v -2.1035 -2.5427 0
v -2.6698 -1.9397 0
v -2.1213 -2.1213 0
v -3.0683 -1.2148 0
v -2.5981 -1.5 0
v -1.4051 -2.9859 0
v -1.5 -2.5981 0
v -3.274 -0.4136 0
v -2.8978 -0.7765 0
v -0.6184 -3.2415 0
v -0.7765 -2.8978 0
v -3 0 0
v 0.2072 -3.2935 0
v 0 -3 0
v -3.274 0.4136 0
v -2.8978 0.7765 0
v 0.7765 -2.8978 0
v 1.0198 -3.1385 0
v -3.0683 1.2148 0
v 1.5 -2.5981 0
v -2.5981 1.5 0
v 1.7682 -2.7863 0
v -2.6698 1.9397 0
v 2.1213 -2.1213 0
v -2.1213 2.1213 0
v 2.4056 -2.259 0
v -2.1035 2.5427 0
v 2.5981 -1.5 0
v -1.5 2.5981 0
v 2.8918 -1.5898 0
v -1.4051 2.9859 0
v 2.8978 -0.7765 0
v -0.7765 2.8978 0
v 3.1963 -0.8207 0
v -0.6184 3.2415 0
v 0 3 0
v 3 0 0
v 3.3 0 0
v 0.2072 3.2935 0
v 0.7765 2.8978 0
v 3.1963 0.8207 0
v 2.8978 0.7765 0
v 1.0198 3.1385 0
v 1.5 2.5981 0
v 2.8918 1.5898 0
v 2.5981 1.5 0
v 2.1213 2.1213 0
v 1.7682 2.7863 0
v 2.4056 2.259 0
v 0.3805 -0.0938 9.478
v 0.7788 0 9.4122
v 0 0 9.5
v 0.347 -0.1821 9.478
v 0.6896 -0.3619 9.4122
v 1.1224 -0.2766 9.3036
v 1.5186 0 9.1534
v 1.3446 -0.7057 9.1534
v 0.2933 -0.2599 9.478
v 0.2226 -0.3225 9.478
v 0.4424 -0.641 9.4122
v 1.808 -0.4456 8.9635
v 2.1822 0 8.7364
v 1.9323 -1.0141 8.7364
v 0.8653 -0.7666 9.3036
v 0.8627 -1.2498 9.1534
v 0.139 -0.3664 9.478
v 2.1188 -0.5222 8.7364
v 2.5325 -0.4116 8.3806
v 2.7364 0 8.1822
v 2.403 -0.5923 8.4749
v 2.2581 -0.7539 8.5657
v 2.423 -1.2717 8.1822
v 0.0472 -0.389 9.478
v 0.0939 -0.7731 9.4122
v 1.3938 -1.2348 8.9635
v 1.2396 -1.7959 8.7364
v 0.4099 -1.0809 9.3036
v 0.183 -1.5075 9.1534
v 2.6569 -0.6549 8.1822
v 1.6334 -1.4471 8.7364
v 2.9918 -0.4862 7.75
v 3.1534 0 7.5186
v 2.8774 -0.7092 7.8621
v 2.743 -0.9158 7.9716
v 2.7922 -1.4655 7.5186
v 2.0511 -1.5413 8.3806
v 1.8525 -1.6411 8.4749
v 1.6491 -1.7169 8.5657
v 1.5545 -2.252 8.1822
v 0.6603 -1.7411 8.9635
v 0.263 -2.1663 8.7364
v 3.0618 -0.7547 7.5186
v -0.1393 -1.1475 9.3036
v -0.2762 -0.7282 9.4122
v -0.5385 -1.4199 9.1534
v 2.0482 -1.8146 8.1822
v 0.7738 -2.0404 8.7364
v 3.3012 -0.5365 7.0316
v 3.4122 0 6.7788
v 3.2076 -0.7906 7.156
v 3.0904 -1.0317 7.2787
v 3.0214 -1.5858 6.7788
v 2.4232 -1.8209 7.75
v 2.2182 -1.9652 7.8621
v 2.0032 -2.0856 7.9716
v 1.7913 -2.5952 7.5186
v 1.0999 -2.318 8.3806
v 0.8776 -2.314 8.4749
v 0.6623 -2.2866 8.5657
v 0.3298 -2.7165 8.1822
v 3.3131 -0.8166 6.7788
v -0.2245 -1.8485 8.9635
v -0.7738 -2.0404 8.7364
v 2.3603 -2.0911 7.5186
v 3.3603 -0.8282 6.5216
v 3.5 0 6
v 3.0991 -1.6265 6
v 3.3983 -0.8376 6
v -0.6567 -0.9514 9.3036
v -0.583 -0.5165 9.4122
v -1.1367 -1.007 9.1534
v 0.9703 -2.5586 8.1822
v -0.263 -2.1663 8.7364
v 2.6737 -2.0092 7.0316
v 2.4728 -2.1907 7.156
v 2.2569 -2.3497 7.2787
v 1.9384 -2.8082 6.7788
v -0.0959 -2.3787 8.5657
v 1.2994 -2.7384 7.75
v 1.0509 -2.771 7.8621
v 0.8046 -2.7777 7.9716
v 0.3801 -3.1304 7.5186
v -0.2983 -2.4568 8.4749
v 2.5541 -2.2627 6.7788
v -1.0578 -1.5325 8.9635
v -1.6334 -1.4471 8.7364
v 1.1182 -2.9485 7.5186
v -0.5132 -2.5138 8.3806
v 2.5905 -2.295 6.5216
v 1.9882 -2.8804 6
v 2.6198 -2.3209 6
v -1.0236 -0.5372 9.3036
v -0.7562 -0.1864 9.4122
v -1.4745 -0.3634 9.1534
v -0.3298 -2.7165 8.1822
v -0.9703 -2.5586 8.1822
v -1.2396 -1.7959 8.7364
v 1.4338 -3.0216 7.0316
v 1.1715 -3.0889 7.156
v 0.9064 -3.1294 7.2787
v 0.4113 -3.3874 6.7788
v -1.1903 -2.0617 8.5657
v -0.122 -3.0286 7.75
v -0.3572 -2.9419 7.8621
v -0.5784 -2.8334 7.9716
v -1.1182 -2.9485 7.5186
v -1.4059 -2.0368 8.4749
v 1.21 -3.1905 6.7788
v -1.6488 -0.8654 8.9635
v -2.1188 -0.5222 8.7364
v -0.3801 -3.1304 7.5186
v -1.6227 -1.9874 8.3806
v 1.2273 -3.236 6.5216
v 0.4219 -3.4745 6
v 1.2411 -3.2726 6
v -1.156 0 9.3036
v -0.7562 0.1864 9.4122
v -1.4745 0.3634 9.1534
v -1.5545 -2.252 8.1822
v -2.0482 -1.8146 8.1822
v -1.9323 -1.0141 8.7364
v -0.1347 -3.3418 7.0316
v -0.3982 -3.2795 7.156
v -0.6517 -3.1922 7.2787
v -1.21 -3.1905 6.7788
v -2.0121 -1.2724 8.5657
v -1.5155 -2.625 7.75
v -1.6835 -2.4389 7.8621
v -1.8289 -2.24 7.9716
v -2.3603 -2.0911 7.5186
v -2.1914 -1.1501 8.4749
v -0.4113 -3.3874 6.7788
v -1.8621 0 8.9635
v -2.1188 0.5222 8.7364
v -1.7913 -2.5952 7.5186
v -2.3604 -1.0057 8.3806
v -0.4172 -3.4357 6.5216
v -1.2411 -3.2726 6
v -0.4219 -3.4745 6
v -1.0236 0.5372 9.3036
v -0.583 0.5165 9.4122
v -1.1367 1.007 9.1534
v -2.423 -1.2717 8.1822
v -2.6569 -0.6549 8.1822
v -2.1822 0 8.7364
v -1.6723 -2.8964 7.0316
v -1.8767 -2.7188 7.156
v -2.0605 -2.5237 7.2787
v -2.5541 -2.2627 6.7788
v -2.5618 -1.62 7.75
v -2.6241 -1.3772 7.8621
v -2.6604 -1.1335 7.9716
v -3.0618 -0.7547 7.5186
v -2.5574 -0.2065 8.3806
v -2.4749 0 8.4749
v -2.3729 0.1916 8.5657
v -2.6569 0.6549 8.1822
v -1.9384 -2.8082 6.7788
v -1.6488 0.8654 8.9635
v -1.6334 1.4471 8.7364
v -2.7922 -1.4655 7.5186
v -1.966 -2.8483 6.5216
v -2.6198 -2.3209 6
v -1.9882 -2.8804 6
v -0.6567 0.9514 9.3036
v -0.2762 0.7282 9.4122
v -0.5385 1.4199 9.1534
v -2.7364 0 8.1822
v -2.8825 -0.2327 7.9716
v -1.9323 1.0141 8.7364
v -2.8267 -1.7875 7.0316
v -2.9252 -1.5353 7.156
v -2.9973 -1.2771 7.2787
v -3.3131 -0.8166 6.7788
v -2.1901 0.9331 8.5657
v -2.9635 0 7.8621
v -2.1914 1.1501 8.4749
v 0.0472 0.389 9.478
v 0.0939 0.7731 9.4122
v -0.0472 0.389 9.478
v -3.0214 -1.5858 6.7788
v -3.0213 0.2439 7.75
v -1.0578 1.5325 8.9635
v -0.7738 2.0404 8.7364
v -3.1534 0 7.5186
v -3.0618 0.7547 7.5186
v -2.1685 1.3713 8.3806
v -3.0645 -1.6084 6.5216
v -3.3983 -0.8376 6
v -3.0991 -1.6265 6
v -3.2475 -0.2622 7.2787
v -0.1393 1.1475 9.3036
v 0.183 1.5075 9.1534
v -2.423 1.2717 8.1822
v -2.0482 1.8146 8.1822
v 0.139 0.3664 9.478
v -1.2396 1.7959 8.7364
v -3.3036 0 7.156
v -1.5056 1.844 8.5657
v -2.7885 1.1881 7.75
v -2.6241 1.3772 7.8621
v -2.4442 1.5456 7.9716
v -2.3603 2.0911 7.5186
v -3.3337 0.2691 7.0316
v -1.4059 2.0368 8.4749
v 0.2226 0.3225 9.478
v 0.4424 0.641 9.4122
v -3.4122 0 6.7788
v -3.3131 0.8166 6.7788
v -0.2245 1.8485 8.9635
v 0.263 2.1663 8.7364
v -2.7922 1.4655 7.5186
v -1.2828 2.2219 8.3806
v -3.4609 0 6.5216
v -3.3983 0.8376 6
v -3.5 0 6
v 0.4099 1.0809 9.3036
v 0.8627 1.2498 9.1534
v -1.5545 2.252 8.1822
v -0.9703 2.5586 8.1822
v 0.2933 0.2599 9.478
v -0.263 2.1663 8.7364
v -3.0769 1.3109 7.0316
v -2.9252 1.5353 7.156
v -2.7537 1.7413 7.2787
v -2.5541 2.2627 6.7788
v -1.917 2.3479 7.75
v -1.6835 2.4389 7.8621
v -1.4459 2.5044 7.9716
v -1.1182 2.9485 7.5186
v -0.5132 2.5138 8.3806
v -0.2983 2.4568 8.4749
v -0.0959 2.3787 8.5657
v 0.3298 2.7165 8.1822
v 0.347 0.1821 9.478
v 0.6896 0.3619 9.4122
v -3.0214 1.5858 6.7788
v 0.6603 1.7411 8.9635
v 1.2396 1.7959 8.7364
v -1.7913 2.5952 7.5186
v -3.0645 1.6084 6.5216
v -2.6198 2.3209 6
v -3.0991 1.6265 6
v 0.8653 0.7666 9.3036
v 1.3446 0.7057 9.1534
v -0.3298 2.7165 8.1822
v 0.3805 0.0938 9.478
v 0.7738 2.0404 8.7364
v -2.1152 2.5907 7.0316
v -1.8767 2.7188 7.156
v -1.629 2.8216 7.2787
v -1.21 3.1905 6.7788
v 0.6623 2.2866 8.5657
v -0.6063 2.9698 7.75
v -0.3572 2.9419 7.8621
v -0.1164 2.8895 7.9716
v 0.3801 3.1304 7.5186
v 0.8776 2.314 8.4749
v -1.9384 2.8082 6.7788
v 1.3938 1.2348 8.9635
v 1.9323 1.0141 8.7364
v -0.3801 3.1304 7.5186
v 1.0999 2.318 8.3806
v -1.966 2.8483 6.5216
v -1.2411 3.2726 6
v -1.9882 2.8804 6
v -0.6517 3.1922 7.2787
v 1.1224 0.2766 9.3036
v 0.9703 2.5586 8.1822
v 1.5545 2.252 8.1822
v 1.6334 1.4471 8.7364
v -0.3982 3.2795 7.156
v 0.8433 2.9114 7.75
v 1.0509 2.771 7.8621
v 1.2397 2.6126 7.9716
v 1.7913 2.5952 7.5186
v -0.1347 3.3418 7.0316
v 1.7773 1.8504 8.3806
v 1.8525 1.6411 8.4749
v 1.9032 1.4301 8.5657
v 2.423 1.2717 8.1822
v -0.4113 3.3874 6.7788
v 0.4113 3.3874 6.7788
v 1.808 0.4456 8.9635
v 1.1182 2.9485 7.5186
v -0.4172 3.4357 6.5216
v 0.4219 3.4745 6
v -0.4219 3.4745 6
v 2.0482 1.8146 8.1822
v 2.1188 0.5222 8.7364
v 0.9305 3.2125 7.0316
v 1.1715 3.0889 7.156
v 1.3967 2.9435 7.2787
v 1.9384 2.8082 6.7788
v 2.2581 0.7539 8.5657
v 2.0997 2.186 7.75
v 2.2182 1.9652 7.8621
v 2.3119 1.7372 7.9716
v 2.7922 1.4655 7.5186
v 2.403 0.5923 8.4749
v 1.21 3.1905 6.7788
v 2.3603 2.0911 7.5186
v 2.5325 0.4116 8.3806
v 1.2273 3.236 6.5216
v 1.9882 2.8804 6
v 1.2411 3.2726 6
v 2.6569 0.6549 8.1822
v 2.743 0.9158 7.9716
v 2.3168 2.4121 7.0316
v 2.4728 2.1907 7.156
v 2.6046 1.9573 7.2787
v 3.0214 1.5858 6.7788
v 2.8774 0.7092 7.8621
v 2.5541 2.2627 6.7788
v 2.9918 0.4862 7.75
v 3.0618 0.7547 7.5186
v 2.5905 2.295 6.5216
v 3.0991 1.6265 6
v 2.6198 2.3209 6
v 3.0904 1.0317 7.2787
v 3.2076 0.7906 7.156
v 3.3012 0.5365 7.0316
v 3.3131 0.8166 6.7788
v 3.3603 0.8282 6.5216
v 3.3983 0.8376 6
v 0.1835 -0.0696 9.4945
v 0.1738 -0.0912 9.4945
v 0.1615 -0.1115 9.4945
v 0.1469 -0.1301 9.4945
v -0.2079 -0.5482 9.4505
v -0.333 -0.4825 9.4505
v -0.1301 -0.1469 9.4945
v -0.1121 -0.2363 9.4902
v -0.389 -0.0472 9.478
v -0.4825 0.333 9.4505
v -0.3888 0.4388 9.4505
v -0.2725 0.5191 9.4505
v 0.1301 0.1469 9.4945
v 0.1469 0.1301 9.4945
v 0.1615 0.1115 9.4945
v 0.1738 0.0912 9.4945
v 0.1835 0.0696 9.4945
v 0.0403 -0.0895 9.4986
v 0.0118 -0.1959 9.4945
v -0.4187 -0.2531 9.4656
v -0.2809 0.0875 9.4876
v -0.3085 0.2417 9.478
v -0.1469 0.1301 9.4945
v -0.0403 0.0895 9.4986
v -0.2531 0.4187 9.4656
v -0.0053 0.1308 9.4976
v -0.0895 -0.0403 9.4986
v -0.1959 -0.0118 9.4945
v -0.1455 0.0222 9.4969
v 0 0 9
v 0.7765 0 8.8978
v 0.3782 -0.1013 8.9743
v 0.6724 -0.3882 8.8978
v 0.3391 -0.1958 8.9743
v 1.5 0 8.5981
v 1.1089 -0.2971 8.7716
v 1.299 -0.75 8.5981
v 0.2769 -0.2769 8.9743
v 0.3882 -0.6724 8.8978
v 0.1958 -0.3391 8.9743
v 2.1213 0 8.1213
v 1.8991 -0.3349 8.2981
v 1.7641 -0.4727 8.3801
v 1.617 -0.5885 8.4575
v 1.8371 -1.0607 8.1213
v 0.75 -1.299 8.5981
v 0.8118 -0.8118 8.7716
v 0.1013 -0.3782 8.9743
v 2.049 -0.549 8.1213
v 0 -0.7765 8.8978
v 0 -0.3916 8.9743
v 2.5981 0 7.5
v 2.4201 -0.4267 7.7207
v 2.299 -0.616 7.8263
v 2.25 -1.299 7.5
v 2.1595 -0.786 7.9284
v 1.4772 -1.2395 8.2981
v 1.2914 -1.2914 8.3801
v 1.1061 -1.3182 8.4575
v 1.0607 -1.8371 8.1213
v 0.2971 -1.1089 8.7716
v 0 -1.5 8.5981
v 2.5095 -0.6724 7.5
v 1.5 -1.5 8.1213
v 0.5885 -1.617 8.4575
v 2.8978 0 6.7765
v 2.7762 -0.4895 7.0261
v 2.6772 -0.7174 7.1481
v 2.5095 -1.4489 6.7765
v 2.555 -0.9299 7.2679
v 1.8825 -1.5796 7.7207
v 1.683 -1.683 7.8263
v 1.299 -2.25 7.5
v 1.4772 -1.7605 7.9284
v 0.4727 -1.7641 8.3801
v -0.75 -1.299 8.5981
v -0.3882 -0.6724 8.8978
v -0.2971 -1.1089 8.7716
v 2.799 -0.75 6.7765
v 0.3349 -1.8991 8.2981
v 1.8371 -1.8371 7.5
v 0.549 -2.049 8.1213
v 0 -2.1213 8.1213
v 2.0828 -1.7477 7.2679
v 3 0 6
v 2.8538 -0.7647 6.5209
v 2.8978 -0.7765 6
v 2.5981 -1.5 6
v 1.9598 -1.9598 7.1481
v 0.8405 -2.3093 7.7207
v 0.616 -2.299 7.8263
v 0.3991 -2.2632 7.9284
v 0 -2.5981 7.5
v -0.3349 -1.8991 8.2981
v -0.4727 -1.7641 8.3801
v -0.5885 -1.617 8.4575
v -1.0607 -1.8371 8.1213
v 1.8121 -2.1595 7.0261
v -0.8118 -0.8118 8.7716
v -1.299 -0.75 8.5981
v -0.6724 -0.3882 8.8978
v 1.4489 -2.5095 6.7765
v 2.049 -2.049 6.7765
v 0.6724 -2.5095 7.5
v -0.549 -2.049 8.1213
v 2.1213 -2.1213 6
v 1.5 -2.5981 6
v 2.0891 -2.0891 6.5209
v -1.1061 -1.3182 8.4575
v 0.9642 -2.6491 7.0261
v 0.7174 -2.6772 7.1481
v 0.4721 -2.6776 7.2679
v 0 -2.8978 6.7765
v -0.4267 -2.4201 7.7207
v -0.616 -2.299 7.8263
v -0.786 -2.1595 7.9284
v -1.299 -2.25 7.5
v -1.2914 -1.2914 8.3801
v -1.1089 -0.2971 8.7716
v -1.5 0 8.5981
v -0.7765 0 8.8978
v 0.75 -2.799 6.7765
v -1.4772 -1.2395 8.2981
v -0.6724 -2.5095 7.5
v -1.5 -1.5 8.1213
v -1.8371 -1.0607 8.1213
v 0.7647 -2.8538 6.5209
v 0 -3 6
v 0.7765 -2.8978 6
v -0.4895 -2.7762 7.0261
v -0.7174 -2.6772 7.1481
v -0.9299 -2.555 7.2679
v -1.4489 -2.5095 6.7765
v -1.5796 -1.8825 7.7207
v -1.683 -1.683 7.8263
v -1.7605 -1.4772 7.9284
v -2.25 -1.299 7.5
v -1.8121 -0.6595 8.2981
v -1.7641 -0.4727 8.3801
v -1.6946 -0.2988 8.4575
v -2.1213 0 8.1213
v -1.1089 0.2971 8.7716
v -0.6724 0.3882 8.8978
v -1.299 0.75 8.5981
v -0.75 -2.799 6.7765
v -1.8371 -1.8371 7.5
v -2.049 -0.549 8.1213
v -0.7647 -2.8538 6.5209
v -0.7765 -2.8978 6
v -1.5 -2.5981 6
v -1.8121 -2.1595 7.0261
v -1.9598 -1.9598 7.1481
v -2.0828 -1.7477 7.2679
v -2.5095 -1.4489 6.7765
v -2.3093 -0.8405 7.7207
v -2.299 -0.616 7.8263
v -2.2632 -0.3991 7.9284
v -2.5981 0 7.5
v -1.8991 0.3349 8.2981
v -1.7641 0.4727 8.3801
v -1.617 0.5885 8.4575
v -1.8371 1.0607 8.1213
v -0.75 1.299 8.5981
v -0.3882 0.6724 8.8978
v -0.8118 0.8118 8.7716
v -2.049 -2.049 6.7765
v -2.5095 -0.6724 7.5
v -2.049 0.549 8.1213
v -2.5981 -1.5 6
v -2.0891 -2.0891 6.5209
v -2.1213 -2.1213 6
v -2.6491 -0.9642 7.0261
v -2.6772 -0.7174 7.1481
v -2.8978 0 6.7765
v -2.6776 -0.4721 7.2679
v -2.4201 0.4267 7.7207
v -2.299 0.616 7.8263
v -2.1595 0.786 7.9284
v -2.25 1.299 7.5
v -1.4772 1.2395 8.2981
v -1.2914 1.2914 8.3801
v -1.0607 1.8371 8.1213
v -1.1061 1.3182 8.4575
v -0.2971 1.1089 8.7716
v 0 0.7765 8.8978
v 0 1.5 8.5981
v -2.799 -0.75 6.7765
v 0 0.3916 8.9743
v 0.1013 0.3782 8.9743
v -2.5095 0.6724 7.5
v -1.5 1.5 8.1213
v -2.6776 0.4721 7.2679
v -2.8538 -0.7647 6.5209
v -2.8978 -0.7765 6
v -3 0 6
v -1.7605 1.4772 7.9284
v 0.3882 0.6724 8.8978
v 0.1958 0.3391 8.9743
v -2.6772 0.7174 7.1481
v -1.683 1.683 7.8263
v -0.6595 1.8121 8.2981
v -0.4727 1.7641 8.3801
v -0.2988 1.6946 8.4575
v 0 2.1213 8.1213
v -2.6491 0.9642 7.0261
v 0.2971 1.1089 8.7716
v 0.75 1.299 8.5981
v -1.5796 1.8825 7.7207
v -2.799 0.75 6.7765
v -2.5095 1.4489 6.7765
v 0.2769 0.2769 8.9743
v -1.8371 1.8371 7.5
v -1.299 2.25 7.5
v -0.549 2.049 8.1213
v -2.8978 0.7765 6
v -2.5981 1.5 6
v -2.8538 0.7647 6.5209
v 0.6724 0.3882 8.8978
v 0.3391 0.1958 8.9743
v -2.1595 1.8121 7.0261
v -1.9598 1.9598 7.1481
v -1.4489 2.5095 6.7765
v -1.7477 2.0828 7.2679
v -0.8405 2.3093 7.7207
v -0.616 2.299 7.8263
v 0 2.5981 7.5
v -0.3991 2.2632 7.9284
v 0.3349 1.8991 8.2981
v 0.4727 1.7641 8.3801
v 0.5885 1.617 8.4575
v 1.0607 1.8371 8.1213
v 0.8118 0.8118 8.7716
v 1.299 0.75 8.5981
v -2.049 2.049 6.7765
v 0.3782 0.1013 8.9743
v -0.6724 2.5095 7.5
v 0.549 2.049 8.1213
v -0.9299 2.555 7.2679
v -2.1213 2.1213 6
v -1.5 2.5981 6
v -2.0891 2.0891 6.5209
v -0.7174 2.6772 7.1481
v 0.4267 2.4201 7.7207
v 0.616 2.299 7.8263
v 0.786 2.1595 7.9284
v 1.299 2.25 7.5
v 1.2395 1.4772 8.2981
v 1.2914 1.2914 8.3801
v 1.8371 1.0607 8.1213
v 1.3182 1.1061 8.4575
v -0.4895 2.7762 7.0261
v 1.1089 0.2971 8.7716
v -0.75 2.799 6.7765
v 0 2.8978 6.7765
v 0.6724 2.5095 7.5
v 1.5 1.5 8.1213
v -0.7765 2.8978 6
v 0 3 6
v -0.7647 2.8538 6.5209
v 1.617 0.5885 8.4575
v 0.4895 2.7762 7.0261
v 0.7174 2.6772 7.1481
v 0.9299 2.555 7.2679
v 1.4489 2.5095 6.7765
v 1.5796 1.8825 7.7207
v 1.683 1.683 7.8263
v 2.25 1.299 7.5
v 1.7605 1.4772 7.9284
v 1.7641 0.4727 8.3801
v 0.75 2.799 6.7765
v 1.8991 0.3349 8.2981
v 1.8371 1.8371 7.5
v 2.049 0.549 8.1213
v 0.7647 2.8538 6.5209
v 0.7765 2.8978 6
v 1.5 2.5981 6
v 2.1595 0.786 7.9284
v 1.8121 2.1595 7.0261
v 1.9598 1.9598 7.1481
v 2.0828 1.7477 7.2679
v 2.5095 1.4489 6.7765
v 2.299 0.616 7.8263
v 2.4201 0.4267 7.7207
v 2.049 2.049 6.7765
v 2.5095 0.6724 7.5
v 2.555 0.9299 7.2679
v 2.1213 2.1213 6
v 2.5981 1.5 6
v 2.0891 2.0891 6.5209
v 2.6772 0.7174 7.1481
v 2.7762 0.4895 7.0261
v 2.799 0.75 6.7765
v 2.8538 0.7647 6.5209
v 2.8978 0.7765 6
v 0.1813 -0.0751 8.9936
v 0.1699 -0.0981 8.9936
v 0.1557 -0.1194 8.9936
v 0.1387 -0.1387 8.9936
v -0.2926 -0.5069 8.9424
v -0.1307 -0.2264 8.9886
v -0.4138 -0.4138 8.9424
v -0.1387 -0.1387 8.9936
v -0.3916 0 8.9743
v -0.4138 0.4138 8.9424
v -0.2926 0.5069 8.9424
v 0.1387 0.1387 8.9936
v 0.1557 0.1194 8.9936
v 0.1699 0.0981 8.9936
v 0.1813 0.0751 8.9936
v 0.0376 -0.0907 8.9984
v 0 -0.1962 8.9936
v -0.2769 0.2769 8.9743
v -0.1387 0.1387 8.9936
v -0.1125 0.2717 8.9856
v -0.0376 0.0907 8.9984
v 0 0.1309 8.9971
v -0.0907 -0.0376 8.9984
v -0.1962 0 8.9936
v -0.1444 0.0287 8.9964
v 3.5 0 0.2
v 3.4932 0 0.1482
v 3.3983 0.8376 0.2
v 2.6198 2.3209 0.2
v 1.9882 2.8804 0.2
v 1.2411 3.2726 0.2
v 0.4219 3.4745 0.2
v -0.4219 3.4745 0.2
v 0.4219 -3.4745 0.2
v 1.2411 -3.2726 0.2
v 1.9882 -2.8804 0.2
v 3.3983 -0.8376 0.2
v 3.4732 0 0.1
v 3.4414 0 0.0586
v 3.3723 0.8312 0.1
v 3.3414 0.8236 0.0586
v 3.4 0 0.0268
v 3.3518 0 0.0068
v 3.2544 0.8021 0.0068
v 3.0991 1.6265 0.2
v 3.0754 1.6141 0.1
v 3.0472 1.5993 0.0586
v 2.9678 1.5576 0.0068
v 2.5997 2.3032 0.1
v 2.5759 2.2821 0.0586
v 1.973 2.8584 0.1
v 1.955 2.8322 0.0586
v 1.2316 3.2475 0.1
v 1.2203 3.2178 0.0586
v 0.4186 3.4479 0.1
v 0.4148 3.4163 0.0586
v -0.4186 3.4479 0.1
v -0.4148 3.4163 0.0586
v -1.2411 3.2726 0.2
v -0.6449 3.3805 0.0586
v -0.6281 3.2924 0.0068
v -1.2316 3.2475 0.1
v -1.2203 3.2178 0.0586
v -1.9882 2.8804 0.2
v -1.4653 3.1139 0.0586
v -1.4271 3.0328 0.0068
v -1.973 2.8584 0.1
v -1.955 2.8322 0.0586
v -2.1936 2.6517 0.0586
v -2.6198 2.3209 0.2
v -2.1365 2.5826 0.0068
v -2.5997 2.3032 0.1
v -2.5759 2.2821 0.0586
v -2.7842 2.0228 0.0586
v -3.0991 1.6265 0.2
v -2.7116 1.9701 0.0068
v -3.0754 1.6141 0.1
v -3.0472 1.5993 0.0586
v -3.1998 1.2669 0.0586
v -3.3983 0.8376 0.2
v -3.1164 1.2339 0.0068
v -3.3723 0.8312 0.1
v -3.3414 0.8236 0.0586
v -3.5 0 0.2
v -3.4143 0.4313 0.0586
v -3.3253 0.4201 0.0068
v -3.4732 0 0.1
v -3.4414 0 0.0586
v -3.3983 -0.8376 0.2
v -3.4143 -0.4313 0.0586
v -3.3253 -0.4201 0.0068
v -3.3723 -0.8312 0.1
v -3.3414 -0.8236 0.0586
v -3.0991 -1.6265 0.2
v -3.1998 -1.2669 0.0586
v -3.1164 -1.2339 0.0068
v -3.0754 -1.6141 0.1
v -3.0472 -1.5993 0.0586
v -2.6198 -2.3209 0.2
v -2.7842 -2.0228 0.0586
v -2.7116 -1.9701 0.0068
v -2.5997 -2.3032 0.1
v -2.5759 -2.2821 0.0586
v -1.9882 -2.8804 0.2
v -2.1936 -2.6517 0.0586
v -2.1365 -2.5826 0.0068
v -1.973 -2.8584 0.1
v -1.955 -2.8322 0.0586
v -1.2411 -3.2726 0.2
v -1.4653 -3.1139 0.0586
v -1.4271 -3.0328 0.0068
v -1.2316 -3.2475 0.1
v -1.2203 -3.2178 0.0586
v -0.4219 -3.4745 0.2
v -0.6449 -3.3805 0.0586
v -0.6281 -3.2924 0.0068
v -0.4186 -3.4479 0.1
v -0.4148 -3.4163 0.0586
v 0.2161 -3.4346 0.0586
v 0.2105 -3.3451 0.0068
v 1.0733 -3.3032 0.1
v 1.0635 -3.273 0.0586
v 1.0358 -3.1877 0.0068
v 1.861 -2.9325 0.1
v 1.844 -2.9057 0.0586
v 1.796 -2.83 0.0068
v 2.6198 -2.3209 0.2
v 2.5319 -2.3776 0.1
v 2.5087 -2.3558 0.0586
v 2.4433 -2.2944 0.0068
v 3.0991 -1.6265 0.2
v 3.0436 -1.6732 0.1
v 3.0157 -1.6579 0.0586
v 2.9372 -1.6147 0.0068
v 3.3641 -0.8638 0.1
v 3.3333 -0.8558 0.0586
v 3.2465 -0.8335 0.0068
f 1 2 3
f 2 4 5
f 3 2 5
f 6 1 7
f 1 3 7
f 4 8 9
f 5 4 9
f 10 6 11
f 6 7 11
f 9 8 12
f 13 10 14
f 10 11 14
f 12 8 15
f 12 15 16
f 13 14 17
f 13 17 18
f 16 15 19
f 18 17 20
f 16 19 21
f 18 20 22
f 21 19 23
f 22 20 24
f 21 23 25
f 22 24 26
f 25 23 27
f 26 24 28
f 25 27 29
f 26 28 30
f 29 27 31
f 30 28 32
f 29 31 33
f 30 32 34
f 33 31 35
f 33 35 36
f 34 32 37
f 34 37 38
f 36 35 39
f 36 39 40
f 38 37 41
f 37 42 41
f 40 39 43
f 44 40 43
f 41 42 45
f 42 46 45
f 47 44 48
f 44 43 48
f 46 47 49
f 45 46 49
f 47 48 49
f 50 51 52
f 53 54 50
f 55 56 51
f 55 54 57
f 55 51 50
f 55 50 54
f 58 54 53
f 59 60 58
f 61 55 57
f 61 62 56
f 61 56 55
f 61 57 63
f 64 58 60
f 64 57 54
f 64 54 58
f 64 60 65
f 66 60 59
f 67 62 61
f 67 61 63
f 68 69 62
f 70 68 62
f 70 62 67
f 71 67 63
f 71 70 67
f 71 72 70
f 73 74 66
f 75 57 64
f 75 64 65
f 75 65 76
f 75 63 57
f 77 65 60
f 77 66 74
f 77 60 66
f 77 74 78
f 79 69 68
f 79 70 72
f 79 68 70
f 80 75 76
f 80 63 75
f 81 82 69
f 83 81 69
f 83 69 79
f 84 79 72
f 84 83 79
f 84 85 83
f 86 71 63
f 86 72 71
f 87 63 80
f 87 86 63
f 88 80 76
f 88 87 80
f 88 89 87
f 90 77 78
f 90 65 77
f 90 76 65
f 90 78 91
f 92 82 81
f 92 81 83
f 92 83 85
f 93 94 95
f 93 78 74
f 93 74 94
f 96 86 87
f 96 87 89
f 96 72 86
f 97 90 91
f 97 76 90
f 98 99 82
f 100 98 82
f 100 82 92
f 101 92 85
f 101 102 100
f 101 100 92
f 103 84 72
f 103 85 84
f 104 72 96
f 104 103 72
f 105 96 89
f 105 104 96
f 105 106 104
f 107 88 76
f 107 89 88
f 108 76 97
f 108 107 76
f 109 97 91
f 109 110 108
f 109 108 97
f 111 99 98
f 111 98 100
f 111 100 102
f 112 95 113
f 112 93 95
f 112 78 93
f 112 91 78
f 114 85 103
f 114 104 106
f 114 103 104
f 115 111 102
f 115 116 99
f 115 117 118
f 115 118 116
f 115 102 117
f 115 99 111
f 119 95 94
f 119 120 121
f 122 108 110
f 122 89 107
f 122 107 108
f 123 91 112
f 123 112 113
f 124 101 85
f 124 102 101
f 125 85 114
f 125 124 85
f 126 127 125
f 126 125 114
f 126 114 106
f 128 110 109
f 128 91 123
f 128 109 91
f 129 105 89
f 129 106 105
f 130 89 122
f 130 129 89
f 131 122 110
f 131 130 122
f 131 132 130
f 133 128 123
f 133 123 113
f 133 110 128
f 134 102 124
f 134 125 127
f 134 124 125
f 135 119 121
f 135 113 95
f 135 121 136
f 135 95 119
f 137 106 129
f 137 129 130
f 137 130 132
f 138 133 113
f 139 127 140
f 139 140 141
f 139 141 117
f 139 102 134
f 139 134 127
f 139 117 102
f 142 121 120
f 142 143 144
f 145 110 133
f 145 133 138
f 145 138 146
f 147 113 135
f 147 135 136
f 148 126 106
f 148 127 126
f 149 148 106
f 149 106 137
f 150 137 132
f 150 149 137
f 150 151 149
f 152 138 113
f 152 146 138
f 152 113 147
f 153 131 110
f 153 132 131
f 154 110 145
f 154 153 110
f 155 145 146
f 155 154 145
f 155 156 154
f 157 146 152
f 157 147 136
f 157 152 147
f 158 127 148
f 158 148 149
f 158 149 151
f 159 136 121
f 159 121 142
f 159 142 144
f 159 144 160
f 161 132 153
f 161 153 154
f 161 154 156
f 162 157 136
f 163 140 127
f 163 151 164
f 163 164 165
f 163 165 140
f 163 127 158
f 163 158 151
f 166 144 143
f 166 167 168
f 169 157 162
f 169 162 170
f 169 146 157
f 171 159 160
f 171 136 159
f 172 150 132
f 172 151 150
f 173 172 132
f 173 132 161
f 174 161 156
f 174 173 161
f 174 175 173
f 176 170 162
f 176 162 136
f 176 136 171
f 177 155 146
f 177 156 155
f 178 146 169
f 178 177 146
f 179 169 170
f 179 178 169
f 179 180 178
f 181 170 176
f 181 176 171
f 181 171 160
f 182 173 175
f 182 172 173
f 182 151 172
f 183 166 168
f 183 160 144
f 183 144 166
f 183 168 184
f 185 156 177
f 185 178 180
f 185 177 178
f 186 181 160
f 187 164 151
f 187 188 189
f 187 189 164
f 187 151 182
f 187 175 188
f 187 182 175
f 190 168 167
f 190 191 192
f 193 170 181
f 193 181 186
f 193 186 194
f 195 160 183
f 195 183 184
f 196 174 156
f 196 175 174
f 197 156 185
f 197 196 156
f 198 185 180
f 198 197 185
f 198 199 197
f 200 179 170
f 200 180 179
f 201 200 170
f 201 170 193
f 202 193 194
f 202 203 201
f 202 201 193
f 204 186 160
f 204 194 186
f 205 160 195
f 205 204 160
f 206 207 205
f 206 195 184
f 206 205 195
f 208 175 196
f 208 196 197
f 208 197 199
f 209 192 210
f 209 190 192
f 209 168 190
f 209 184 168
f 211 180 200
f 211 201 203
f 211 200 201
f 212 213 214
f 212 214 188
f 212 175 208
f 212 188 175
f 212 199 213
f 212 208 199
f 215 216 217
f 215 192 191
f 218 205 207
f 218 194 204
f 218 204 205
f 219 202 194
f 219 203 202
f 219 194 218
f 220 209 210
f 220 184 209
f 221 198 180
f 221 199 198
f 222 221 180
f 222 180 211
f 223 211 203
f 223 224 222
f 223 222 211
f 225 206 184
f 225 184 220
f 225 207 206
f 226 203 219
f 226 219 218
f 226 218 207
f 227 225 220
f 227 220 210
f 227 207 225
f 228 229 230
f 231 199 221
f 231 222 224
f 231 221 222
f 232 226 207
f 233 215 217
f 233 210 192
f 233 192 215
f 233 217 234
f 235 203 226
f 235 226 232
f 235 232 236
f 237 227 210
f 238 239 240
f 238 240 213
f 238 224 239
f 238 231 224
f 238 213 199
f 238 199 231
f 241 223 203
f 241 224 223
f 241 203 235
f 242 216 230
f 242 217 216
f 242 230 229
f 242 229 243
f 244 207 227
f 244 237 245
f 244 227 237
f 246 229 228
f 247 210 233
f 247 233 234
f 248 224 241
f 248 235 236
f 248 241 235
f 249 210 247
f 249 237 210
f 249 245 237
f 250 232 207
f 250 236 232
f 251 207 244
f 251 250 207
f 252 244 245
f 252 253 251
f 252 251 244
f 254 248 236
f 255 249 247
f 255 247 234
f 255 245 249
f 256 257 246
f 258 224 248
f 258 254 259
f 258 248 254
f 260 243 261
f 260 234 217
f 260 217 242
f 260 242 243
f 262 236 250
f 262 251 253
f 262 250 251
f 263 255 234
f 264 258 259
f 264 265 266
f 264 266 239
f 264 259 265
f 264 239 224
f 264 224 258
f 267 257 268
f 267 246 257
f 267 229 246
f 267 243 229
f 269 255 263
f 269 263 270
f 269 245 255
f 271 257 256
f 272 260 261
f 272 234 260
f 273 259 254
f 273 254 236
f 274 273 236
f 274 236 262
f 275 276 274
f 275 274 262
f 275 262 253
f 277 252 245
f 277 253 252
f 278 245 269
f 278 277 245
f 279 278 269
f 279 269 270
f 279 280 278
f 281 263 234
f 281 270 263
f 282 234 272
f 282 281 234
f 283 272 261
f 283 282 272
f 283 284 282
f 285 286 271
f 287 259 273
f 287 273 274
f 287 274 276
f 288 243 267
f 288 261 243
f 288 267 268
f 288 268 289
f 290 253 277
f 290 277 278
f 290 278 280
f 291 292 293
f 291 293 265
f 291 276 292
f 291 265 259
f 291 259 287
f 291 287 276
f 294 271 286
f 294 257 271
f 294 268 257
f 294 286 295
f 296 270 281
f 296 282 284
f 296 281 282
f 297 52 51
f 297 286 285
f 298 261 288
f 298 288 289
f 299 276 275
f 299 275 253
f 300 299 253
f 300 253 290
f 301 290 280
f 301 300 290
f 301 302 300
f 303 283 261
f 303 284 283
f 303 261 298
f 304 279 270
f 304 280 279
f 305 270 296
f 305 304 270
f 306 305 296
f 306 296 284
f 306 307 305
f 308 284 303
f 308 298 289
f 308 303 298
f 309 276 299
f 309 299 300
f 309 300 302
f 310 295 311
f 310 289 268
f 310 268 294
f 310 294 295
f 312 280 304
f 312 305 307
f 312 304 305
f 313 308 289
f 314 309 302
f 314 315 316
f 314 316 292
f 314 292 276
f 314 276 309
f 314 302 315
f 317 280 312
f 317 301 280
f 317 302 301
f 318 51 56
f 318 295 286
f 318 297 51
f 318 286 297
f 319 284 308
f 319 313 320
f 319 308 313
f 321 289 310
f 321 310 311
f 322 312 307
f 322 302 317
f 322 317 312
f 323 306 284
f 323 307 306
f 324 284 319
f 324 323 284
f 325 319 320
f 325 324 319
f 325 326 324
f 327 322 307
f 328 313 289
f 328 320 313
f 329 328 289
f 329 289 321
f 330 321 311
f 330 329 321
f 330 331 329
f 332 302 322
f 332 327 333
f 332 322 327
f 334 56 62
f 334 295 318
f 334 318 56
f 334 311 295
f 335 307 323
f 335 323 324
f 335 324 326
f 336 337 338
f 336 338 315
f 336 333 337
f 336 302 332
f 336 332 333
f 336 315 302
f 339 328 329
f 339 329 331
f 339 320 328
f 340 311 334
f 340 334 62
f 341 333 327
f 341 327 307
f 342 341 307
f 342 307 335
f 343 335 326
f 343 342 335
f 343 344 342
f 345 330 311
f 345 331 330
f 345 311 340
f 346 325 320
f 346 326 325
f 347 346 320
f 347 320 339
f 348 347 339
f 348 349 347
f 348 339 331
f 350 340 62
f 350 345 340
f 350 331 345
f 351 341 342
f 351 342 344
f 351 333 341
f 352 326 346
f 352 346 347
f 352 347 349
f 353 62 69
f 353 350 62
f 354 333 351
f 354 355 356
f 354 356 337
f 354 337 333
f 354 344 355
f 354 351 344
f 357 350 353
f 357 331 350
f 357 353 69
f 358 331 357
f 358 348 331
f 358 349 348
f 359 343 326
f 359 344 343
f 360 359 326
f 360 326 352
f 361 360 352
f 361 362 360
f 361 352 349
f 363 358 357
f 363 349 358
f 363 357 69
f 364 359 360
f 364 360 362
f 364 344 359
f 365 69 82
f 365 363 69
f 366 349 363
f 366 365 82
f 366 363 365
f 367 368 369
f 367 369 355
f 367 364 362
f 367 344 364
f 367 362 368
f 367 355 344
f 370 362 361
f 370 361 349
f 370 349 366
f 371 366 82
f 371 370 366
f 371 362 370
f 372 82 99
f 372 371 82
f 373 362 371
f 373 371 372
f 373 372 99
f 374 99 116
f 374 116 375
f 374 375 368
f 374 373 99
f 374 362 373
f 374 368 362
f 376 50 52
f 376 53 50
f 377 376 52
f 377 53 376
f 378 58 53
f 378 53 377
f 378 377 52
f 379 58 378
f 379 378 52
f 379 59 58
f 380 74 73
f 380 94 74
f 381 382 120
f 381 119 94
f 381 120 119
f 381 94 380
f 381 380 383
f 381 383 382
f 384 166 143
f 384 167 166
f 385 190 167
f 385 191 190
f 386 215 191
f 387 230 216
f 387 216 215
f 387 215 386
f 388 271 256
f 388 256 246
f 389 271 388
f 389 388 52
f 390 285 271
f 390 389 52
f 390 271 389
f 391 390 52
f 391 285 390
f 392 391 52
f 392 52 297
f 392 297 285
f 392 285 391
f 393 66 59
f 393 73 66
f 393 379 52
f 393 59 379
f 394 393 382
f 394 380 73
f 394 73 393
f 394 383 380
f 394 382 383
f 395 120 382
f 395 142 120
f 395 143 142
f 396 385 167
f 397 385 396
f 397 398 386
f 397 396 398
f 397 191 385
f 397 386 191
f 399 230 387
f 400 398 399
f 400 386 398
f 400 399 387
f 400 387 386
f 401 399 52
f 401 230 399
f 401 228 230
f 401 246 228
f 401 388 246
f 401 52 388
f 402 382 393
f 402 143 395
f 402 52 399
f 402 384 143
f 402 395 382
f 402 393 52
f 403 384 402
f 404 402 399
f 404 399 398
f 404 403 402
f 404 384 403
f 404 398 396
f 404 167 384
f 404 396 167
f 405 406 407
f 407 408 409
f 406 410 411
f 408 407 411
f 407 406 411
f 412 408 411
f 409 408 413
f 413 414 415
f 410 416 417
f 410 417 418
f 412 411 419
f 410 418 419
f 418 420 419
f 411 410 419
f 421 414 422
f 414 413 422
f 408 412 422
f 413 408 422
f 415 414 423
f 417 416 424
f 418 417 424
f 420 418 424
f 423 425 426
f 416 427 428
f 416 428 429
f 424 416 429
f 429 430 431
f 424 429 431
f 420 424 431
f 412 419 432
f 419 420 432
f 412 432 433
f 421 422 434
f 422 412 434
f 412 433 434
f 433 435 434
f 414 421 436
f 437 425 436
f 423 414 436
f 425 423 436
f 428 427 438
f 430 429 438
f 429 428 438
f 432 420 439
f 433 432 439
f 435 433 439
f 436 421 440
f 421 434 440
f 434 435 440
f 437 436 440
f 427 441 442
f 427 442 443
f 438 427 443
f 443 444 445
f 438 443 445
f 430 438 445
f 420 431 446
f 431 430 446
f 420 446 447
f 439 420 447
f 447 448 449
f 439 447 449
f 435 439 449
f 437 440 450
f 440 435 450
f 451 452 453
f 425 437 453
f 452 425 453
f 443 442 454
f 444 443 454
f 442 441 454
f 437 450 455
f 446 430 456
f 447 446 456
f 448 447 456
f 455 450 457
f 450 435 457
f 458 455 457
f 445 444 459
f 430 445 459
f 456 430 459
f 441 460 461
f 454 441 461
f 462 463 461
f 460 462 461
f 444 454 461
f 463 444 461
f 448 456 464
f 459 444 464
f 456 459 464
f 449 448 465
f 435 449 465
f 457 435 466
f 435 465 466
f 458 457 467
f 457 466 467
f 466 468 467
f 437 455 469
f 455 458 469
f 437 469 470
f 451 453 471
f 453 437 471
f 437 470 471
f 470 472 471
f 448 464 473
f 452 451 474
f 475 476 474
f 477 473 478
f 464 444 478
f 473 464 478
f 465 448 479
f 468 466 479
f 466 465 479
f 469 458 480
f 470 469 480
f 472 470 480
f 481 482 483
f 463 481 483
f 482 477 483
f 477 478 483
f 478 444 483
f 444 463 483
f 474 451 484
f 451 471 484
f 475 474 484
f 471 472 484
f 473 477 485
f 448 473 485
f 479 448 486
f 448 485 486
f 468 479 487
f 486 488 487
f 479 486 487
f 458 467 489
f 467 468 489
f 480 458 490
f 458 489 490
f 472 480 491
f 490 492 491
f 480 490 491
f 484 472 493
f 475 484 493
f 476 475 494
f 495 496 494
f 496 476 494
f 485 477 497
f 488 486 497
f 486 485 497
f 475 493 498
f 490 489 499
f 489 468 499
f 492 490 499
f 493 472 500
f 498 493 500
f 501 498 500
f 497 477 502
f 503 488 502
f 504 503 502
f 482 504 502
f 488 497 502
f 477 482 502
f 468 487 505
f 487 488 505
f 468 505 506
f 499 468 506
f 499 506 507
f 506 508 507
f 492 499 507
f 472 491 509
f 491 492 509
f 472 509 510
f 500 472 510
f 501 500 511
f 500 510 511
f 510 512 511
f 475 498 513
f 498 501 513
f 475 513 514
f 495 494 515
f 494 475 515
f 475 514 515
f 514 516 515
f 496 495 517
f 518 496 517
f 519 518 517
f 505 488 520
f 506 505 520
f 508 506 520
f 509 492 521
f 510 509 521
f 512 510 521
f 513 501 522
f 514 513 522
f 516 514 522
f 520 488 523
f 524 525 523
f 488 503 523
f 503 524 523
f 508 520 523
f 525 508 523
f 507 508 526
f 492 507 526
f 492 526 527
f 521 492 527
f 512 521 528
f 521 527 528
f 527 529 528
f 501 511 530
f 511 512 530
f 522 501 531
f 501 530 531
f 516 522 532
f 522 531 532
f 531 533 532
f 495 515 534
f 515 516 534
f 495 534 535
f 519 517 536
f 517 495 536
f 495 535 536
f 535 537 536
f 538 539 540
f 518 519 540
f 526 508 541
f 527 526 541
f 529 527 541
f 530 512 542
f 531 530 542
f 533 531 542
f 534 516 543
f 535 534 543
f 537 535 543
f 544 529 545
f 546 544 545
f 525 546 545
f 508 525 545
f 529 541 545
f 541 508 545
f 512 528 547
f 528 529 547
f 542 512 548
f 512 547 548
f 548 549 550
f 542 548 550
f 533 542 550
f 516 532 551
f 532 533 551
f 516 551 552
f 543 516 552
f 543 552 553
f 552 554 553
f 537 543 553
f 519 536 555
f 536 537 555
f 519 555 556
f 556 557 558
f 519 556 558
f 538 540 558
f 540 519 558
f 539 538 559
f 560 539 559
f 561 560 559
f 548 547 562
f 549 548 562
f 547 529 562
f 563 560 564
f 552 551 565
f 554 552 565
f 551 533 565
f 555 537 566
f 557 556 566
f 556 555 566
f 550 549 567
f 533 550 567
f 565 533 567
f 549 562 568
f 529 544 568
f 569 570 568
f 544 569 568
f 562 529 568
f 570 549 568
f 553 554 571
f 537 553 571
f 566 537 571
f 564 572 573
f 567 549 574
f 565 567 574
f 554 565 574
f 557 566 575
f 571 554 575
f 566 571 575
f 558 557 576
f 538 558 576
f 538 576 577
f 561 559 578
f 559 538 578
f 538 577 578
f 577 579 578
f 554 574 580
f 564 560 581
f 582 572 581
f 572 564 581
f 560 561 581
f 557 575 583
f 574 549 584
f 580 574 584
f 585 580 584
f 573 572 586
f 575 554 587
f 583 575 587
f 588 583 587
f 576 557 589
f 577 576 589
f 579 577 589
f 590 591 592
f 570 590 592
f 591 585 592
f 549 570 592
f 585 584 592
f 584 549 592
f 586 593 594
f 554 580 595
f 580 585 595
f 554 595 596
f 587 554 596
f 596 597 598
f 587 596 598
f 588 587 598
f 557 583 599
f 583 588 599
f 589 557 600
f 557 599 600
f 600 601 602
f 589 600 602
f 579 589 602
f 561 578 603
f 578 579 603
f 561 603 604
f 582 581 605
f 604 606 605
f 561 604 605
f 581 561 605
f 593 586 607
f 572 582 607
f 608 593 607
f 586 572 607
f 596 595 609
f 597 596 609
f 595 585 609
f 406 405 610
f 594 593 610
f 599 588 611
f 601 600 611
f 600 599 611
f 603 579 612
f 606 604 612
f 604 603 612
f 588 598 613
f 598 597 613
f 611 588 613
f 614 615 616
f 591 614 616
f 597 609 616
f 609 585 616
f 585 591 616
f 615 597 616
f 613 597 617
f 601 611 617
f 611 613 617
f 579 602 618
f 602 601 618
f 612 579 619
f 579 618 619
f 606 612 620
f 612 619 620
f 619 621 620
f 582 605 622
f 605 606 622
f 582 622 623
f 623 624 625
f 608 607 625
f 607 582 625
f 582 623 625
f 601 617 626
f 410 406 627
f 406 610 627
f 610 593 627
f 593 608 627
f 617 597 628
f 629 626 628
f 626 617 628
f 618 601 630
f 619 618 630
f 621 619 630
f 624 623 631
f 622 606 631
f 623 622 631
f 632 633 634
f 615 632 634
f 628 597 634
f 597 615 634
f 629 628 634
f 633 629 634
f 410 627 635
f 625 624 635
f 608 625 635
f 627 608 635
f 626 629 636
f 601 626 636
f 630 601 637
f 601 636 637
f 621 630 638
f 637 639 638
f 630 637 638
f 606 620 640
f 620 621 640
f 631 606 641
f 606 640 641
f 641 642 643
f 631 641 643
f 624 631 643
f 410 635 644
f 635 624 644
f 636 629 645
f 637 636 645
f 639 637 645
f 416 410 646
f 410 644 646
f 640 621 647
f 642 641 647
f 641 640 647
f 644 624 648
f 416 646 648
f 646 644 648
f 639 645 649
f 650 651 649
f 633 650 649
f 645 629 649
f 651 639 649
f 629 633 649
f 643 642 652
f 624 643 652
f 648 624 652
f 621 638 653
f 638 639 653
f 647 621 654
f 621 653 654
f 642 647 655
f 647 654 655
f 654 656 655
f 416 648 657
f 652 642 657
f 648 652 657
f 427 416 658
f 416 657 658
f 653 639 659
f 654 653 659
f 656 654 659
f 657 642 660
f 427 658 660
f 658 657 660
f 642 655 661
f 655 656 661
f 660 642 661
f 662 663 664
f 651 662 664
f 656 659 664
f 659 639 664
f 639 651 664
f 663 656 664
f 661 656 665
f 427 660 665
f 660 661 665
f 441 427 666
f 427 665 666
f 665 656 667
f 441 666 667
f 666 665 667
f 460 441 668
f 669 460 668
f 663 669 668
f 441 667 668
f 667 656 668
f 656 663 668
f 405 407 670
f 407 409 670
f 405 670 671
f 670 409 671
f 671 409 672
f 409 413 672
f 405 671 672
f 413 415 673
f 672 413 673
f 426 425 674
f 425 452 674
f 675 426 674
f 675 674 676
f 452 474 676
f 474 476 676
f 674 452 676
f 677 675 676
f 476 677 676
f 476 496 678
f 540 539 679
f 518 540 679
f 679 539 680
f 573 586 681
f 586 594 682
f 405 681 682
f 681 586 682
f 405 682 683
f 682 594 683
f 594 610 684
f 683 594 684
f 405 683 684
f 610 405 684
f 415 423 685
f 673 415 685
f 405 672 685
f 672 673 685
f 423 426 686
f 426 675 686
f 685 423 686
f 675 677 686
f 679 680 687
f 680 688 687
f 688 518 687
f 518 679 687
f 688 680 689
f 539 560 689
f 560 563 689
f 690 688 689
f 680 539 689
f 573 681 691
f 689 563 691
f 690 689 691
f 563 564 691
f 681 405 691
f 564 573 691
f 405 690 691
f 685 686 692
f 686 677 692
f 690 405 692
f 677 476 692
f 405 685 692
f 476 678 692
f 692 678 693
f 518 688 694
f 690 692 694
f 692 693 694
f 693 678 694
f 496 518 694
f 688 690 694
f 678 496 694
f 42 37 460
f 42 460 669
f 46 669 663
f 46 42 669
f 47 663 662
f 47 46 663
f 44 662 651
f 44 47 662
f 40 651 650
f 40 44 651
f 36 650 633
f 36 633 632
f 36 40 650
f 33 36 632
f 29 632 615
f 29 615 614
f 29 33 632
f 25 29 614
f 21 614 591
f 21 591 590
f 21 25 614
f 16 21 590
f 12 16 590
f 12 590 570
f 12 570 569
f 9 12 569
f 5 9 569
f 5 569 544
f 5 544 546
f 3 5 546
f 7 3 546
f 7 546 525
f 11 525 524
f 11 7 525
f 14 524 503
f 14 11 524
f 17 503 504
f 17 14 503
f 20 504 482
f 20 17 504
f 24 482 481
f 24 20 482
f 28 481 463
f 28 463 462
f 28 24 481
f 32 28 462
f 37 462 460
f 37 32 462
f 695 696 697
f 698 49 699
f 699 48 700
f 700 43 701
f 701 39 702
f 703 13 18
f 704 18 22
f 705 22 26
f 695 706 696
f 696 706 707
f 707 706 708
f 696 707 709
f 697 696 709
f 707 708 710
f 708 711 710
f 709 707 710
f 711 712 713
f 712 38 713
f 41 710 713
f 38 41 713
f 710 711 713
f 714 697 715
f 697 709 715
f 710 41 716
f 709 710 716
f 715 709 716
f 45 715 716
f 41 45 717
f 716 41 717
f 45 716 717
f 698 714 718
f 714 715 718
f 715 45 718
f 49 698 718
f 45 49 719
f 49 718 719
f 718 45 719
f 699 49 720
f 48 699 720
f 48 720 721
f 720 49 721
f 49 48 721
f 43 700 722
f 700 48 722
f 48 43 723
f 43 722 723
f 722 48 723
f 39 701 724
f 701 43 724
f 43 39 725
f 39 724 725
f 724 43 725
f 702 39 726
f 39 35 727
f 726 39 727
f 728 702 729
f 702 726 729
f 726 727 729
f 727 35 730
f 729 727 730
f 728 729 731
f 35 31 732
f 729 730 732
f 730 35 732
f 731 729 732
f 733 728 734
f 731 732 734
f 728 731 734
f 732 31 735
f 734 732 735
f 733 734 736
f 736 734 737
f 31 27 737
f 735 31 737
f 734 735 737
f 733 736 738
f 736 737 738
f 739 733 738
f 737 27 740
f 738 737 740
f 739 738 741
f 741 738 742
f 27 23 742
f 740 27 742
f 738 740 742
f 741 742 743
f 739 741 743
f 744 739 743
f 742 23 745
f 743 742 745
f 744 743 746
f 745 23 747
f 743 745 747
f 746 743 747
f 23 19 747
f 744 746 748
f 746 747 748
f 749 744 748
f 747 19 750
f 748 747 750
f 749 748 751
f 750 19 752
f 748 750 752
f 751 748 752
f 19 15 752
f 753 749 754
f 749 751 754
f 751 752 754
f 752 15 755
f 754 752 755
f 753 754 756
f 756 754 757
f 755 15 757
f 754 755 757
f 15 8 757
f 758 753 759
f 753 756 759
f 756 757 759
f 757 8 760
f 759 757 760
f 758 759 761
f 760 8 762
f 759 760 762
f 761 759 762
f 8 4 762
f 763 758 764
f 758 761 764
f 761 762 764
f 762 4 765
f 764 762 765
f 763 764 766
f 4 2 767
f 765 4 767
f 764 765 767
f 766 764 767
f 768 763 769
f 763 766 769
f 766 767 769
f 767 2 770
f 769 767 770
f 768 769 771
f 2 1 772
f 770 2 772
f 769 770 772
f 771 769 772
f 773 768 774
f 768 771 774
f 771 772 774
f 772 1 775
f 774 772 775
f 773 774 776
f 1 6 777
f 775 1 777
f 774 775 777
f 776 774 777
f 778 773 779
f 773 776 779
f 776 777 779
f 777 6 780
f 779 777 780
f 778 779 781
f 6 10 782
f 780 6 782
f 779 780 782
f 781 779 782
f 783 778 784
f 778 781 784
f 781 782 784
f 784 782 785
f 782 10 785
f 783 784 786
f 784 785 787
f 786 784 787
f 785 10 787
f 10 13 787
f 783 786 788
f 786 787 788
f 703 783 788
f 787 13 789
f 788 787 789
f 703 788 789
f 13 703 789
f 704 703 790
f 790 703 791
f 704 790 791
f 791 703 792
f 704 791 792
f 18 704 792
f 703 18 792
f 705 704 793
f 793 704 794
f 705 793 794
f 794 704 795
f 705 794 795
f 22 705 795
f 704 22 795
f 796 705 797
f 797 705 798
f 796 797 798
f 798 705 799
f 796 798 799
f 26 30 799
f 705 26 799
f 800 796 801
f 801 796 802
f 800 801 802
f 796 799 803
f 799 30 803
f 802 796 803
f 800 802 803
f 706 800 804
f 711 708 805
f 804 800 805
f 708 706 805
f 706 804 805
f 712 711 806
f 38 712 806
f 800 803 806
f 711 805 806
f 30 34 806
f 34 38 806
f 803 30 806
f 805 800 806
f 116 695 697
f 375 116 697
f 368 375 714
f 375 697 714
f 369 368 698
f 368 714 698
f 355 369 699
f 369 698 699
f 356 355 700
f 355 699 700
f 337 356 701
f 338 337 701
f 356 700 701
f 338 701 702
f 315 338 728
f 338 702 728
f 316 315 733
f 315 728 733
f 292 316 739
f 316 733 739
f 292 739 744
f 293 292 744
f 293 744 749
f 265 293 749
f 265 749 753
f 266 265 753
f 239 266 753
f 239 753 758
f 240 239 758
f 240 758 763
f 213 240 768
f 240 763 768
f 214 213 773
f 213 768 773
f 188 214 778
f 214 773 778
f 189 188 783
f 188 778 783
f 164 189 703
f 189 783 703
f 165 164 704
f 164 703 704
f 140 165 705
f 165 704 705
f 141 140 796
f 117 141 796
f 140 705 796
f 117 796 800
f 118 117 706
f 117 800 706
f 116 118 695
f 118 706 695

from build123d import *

# Parameters (mm, degrees)
CYLINDER001_R     = 3
CYLINDER001_DEPTH = 6
CYLINDER_R        = 3.5
CYLINDER_DEPTH    = 6
FILLET_R          = 0.2


with BuildPart() as esfera_interior:
    # Sphere001 → Sphere001 (revolve)
    with BuildSketch(Plane(origin=(0, 0, 7), x_dir=(1, 0, 0), z_dir=(0, 1, 0))):
        with BuildLine():
            ThreePointArc((0, -3), (2.12132, -2.12132), (3, 0))
            Line((3, 0), (0, 0))
            Line((0, 0), (0, -3))
        make_face()
    revolve(axis=Axis((0, 0, 7), (0, 0, -1)))


with BuildPart() as esfera:
    # Sphere → Sphere (revolve)
    with BuildSketch(Plane(origin=(0, 0, 7), x_dir=(1, 0, 0), z_dir=(0, 1, 0))):
        with BuildLine():
            ThreePointArc((0, -3.5), (2.474874, -2.474874), (3.5, 0))
            Line((3.5, 0), (0, 0))
            Line((0, 0), (0, -3.5))
        make_face()
    revolve(axis=Axis((0, 0, 7), (0, 0, -1)))

    # Cut001: cut Esfera interior
    add(esfera_interior.part, mode=Mode.SUBTRACT)


with BuildPart() as esfera_1:
    # Cut001 placement: moved
    add(esfera.part.moved(Location((0, 0, -1))))


with BuildPart() as cilindro_interior:
    # Cylinder001 → Cylinder001 (new body)
    with BuildSketch(Plane.XY):
        Circle(CYLINDER001_R)
    extrude(amount=CYLINDER001_DEPTH)


with BuildPart() as toggle_switch_cap:
    # Cylinder → Cylinder (new body)
    with BuildSketch(Plane.XY):
        Circle(CYLINDER_R)
    extrude(amount=CYLINDER_DEPTH)

    # Cut: cut Cilindro interior
    add(cilindro_interior.part, mode=Mode.SUBTRACT)

    # Fillet
    fillet_edges = [toggle_switch_cap.edges().sort_by_distance(p)[0] for p in [
        (-3.5, 0, 0),
    ]]
    fillet(fillet_edges, radius=FILLET_R)

    # Fusion: union Esfera
    add(esfera_1.part)


solid = toggle_switch_cap.part
